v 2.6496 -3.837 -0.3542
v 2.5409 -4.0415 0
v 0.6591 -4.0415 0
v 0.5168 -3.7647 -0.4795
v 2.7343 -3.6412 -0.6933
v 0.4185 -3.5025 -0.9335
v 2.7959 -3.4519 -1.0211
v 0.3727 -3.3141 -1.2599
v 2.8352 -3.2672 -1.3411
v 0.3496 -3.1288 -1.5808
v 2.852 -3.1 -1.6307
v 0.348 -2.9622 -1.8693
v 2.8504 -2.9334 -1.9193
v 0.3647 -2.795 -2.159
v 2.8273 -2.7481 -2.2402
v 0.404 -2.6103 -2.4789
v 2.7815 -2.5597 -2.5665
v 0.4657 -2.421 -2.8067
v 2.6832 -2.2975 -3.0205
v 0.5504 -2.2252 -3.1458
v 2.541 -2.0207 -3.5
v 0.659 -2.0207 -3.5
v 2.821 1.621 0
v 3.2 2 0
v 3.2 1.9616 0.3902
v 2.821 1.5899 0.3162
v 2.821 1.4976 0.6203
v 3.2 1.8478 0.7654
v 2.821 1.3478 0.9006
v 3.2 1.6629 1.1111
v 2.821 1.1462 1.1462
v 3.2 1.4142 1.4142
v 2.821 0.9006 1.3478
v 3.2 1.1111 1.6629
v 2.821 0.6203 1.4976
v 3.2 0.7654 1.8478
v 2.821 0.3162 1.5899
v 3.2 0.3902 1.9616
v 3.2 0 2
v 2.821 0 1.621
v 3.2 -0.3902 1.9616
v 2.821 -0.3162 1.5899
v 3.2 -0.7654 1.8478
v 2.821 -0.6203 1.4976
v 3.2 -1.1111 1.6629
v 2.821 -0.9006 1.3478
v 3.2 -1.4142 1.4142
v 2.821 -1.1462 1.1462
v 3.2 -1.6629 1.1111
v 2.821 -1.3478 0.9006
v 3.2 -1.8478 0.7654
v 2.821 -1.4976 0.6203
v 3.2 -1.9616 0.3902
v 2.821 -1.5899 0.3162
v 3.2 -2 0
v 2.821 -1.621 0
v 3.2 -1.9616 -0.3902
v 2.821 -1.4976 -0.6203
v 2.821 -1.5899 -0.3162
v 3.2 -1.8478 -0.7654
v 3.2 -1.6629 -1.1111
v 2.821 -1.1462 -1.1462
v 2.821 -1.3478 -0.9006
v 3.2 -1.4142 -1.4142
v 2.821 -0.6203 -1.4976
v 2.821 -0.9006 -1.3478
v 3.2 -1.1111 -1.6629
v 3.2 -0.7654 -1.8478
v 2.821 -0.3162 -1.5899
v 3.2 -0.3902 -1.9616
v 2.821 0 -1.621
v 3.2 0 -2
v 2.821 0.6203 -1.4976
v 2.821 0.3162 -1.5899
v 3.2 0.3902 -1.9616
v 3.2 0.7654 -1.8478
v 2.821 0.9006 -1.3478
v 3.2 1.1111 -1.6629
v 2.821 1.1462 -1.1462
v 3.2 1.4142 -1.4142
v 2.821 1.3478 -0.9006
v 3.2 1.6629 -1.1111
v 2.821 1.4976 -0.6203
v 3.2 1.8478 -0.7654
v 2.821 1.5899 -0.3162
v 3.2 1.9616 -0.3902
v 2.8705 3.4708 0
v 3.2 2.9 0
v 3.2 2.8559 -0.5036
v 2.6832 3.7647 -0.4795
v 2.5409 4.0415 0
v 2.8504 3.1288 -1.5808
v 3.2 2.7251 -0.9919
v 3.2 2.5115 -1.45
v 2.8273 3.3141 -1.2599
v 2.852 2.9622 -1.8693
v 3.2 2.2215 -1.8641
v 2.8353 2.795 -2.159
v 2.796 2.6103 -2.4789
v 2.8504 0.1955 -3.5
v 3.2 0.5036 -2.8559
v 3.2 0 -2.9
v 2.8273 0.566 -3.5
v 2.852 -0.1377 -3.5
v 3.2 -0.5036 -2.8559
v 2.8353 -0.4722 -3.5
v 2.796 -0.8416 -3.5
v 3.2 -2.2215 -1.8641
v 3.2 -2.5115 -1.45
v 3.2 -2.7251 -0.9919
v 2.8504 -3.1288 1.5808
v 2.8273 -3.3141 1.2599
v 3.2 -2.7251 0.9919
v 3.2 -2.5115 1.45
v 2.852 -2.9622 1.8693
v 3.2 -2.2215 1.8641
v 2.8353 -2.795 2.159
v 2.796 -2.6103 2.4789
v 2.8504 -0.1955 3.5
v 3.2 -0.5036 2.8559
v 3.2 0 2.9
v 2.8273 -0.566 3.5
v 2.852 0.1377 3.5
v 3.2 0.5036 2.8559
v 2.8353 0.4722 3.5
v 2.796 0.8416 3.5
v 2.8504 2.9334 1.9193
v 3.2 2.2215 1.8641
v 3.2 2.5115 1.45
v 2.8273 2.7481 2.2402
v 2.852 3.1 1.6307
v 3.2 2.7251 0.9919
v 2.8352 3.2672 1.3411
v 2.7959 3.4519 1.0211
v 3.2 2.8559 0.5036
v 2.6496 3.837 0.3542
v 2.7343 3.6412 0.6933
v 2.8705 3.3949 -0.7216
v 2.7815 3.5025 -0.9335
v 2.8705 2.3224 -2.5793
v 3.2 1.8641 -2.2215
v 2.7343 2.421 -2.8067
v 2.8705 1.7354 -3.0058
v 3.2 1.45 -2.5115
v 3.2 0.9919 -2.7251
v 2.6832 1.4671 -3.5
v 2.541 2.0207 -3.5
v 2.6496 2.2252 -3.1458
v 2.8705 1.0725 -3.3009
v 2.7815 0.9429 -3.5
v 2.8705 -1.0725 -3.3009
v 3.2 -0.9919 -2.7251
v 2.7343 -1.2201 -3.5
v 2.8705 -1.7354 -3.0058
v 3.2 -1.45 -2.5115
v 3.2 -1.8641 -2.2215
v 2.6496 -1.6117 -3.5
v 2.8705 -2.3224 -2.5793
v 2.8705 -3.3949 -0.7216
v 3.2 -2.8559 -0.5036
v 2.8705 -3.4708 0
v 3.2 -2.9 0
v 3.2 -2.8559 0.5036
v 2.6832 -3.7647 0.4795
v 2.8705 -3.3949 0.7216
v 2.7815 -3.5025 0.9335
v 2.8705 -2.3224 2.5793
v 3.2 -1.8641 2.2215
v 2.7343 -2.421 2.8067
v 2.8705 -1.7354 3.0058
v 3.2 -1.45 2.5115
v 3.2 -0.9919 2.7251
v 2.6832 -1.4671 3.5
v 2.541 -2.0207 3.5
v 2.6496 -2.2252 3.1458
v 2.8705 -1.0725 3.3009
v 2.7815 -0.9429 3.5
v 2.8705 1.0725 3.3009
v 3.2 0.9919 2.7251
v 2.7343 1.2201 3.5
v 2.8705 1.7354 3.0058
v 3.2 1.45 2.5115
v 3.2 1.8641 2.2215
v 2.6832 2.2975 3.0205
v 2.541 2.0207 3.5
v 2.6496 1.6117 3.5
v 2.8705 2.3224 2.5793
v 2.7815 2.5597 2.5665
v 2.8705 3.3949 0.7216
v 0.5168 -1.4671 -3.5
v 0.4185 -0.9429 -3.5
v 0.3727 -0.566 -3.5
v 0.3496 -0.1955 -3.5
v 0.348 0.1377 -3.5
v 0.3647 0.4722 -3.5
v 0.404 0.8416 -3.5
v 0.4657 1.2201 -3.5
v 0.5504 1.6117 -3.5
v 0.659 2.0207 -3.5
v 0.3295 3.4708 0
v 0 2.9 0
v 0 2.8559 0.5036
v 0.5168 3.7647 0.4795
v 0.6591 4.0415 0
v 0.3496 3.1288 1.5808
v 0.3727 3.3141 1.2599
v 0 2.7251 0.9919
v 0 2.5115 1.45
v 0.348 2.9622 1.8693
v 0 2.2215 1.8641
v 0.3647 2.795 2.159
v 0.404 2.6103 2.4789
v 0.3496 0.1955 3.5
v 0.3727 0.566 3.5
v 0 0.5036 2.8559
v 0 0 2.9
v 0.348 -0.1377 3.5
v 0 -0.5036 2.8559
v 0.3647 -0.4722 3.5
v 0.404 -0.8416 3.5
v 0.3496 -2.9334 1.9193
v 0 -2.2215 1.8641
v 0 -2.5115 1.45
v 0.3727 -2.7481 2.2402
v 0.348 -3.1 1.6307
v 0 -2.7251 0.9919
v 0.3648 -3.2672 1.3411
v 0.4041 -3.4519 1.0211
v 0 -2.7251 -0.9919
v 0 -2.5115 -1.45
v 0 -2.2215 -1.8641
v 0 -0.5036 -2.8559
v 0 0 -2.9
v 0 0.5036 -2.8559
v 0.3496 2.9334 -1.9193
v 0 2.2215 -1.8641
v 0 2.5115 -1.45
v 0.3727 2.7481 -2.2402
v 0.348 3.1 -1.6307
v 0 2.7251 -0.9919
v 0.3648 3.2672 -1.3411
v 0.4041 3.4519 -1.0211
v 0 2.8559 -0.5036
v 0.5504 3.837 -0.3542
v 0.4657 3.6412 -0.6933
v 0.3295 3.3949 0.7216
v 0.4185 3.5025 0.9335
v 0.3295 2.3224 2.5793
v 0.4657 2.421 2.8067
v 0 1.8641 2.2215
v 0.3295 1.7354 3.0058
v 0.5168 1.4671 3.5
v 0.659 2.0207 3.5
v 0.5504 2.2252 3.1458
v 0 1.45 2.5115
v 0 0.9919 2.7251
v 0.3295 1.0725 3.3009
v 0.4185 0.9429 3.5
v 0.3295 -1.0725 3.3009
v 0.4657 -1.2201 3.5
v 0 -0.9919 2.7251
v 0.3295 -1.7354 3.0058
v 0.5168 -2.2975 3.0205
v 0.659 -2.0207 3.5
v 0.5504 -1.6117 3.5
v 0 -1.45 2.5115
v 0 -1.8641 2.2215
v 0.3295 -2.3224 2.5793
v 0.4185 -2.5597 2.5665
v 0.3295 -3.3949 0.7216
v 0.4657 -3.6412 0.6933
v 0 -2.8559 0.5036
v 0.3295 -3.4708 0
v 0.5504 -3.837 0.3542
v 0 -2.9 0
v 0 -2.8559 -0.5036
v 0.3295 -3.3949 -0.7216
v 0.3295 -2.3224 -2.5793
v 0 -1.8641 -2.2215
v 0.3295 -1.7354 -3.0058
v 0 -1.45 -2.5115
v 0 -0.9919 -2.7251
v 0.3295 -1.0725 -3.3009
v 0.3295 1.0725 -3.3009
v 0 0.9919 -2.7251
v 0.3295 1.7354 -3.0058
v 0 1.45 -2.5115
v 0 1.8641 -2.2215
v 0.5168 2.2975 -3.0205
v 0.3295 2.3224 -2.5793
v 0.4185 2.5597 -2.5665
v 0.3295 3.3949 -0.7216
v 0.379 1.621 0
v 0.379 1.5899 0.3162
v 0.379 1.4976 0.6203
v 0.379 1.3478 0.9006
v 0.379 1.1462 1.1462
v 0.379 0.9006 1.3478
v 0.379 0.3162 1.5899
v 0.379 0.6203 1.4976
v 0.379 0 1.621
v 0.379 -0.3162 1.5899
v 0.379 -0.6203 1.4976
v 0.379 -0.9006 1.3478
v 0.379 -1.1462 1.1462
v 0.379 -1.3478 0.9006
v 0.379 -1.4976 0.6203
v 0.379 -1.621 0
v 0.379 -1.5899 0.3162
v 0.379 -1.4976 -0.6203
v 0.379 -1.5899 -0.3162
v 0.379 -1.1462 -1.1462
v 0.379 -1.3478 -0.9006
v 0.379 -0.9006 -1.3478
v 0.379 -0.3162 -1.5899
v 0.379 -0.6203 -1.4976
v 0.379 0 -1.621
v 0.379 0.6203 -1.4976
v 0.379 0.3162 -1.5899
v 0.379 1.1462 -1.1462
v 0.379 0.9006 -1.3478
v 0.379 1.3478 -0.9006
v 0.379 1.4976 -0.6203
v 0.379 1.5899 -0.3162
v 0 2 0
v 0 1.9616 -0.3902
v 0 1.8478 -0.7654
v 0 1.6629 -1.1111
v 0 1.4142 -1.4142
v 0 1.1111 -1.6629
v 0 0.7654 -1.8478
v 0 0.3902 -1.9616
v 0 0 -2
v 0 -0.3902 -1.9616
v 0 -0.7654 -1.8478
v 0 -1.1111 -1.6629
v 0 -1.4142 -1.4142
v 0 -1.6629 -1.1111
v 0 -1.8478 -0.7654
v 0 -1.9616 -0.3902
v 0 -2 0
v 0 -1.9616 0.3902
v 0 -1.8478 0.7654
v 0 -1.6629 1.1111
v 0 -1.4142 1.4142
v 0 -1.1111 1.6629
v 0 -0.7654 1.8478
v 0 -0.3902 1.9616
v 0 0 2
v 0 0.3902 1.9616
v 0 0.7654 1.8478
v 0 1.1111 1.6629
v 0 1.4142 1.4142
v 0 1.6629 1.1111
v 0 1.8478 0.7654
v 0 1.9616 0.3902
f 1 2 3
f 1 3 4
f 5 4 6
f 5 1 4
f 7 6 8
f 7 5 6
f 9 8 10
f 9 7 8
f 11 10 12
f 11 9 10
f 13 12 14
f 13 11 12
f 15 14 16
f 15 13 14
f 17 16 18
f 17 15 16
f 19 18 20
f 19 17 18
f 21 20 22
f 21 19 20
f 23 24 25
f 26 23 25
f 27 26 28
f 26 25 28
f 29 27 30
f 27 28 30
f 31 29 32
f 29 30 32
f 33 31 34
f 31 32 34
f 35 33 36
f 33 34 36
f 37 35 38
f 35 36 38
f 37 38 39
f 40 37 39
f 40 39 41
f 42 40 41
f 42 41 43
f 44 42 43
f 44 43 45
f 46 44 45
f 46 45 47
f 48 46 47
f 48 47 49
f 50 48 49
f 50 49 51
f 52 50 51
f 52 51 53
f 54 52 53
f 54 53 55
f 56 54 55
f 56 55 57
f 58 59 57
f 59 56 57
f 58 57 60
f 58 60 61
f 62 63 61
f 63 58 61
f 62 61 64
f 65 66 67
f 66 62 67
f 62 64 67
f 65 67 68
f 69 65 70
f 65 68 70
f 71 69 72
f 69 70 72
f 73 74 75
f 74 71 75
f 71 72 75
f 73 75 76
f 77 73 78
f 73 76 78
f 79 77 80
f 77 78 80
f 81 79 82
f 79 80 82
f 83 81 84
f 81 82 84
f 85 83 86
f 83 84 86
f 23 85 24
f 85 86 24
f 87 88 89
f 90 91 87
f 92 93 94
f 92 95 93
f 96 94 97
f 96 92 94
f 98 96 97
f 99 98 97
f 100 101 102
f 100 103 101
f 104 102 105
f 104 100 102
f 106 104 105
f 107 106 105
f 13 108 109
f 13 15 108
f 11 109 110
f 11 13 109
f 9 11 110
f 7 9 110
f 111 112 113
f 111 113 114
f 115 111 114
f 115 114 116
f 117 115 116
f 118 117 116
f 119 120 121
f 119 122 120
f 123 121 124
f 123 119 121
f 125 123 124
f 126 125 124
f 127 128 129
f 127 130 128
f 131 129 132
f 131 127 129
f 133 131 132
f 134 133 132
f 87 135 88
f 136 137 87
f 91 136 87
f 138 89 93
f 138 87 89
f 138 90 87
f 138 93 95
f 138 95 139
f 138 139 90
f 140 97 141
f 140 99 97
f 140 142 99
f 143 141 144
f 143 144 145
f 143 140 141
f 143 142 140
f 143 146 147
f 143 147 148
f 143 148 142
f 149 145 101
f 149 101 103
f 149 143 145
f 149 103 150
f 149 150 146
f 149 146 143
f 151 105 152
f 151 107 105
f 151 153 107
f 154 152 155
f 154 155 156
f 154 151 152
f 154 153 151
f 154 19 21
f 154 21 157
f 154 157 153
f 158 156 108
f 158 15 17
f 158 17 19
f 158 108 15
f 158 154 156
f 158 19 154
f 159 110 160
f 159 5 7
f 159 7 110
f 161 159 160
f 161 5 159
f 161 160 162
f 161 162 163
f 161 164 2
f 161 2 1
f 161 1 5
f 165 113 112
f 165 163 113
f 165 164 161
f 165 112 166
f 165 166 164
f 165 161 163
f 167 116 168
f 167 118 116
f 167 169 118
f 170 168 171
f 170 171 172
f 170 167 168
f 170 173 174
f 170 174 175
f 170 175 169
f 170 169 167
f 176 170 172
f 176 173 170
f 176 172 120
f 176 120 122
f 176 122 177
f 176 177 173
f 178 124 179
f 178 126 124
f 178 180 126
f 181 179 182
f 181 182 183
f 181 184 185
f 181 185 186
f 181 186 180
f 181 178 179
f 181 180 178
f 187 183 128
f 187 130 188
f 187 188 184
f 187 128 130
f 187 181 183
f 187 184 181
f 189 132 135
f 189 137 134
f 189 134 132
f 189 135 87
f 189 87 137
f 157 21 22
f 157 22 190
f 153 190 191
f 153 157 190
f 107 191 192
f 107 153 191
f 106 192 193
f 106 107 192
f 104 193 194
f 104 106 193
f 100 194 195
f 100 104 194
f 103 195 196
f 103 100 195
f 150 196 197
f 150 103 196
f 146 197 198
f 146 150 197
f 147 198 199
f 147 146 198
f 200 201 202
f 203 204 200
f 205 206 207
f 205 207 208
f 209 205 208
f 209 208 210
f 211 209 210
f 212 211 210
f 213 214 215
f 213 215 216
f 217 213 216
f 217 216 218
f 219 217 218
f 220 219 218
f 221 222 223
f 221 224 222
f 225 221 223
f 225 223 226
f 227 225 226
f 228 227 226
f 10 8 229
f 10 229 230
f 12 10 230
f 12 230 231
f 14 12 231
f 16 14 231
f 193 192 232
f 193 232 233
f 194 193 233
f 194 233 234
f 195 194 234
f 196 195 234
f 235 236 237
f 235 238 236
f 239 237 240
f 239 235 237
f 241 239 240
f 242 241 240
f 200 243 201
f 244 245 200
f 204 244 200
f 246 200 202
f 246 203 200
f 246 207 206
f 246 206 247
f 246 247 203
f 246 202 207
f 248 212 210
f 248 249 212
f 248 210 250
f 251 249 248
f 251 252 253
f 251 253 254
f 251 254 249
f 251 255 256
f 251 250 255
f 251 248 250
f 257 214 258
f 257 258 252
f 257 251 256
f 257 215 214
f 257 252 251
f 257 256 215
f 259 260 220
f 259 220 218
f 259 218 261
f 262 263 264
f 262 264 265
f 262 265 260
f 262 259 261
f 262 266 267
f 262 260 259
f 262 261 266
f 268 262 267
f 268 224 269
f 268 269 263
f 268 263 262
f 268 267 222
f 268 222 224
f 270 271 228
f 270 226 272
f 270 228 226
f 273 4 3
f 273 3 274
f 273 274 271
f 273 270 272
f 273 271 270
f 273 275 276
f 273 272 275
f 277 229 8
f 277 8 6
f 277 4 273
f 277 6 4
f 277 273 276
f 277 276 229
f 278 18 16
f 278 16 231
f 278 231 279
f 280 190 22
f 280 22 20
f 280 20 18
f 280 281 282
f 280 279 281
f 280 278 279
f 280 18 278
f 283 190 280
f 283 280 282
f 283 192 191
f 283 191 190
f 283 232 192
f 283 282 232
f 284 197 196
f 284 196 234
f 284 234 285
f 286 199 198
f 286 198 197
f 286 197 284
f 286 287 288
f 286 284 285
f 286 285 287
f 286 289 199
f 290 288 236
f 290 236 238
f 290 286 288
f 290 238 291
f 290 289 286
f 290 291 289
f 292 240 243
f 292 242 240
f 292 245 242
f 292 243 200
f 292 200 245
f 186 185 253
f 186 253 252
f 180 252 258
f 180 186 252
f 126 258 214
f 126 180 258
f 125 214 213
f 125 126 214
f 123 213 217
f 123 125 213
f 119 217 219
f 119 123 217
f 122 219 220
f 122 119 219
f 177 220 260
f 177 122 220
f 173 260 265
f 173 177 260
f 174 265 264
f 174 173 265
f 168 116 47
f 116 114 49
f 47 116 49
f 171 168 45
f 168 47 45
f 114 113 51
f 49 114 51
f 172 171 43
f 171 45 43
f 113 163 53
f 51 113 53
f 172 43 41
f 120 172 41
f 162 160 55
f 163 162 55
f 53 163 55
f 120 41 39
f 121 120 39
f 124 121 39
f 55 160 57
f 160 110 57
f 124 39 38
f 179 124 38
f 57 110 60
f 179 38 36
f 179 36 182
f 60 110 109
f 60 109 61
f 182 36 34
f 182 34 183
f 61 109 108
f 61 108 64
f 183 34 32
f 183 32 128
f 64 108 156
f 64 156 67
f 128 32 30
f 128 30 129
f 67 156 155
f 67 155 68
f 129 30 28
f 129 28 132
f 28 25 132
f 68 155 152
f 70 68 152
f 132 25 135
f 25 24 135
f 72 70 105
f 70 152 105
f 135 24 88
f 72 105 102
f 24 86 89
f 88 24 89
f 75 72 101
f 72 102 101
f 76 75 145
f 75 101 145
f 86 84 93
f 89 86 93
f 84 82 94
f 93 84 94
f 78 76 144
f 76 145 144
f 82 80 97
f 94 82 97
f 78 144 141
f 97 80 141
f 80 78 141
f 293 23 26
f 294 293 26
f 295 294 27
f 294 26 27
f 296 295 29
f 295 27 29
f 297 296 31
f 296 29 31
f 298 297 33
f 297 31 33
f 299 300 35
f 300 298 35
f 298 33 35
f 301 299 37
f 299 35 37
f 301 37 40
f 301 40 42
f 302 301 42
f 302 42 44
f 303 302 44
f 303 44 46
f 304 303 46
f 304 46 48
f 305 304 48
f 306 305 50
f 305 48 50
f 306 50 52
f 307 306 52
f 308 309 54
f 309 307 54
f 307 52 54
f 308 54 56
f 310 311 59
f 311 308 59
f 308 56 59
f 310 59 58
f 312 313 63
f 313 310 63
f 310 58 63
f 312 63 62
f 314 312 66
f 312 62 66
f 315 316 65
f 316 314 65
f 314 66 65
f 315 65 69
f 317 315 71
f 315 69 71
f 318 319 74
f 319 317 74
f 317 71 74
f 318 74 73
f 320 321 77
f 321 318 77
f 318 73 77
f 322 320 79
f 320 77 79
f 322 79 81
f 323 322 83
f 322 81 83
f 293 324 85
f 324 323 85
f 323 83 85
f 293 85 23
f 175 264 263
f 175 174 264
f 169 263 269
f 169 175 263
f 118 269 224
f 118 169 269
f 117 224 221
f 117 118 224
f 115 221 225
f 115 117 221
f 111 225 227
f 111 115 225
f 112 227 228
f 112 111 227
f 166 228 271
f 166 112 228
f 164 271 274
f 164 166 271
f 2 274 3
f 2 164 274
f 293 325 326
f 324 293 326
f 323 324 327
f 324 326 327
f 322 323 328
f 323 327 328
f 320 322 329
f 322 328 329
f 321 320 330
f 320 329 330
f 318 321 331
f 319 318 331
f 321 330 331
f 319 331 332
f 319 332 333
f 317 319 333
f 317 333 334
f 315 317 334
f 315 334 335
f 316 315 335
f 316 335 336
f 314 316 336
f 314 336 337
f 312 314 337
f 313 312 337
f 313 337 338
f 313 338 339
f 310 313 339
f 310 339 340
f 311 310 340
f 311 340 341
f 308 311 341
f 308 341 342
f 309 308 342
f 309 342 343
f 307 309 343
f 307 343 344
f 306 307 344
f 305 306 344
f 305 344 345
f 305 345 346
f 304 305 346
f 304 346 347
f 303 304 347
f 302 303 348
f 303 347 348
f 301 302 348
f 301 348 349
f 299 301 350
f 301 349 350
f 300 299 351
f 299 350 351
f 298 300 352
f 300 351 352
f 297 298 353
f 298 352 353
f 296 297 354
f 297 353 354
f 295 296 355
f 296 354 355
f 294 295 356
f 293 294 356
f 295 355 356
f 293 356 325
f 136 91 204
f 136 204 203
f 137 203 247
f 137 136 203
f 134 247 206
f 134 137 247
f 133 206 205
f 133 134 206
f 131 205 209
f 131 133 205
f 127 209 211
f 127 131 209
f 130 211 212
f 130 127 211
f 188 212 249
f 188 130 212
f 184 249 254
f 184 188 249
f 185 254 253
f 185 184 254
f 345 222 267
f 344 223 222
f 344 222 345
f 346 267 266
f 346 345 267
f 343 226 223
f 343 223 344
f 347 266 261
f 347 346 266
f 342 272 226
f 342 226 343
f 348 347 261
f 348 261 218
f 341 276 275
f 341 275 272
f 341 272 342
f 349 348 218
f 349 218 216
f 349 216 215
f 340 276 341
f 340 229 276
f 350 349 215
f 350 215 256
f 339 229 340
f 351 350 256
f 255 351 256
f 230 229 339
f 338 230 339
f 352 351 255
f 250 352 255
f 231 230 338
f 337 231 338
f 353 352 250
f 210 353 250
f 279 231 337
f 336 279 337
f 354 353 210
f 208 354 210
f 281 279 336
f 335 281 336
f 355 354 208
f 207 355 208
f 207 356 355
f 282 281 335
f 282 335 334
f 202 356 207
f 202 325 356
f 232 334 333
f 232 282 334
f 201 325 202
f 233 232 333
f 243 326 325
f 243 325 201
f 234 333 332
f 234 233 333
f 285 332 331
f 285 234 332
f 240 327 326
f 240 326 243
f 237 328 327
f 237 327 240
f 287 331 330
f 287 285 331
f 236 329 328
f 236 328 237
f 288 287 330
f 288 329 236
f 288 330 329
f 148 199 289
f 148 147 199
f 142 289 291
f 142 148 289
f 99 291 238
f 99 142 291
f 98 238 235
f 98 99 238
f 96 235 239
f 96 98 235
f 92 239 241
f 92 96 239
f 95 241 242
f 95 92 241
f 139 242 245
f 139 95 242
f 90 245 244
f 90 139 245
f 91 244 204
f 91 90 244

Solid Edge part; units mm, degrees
sketch "Sketch1" plane through (0, 0, 0) normal (0, 0, 1) x (1, 0, 0)
  line L0 (0, 0) -> (0, 4.2)
  line L1 (0, 4.2) -> (3.2, 4.2)
  line L2 (3.2, 4.2) -> (3.2, 0)
  line L3 (3.2, 0) -> (0, 0)
revolve "RevolvedProtrusion1" add sketch "Sketch1" angle 360 about axis through (3.2, 0, 0) along (-1, 0, 0)
sketch "Sketch2" plane through (0, 0, 0) normal (0, 0, 1) x (1, 0, 0)
  line L0 (-1, 7) -> (-1, 2.9)
  line L1 (-1, 2.9) -> (0, 2.9)
  line L2 (0, 2.9) -> (0.7506, 4.2)
  line L3 (0.7506, 4.2) -> (2.4494, 4.2)
  line L4 (2.4494, 4.2) -> (3.2, 2.9)
  line L5 (3.2, 2.9) -> (3.52, 2.9)
  line L6 (3.52, 2.9) -> (3.52, 7)
  line L7 (3.52, 7) -> (-1, 7)
revolve "RevolvedCutout1" cut sketch "Sketch2" angle 360 about axis through (3.2, 0, 0) along (-1, 0, 0)
sketch "Sketch3" plane through (0, 0, 0) normal (0, 0, 1) x (1, 0, 0)
  line L0 (0, 0) -> (0, 2)
  line L1 (0, 2) -> (0.379, 1.621)
  line L2 (0.379, 1.621) -> (2.821, 1.621)
  line L3 (2.821, 1.621) -> (3.2, 2)
  line L4 (3.2, 2) -> (3.2, 0)
  line L5 (3.2, 0) -> (0, 0)
revolve "RevolvedCutout2" cut sketch "Sketch3" angle 360 about axis through (3.2, 0, 0) along (-1, 0, 0)
sketch "Sketch4" plane through (0, 0, 0) normal (1, 0, 0) x (0, 1, 0)
  line L0 (14, 14) -> (-14, 14)
  line L1 (-14, 14) -> (-14, -14)
  line L2 (-14, -14) -> (14, -14)
  line L3 (14, -14) -> (14, 14)
  line L4 (-2.0207, 3.5) -> (-4.0415, 0)
  line L5 (-4.0415, 0) -> (-2.0207, -3.5)
  line L6 (-2.0207, -3.5) -> (2.0207, -3.5)
  line L7 (2.0207, -3.5) -> (4.0415, 0)
  line L8 (4.0415, 0) -> (2.0207, 3.5)
  line L9 (2.0207, 3.5) -> (-2.0207, 3.5)
extrude "ExtrudedCutout_1" cut sketch "Sketch4" against normal blind 4.2 and the other way blind 4.2
properties part number "Hexagon nut DIN 934 M4 01100.040.001(High)"
